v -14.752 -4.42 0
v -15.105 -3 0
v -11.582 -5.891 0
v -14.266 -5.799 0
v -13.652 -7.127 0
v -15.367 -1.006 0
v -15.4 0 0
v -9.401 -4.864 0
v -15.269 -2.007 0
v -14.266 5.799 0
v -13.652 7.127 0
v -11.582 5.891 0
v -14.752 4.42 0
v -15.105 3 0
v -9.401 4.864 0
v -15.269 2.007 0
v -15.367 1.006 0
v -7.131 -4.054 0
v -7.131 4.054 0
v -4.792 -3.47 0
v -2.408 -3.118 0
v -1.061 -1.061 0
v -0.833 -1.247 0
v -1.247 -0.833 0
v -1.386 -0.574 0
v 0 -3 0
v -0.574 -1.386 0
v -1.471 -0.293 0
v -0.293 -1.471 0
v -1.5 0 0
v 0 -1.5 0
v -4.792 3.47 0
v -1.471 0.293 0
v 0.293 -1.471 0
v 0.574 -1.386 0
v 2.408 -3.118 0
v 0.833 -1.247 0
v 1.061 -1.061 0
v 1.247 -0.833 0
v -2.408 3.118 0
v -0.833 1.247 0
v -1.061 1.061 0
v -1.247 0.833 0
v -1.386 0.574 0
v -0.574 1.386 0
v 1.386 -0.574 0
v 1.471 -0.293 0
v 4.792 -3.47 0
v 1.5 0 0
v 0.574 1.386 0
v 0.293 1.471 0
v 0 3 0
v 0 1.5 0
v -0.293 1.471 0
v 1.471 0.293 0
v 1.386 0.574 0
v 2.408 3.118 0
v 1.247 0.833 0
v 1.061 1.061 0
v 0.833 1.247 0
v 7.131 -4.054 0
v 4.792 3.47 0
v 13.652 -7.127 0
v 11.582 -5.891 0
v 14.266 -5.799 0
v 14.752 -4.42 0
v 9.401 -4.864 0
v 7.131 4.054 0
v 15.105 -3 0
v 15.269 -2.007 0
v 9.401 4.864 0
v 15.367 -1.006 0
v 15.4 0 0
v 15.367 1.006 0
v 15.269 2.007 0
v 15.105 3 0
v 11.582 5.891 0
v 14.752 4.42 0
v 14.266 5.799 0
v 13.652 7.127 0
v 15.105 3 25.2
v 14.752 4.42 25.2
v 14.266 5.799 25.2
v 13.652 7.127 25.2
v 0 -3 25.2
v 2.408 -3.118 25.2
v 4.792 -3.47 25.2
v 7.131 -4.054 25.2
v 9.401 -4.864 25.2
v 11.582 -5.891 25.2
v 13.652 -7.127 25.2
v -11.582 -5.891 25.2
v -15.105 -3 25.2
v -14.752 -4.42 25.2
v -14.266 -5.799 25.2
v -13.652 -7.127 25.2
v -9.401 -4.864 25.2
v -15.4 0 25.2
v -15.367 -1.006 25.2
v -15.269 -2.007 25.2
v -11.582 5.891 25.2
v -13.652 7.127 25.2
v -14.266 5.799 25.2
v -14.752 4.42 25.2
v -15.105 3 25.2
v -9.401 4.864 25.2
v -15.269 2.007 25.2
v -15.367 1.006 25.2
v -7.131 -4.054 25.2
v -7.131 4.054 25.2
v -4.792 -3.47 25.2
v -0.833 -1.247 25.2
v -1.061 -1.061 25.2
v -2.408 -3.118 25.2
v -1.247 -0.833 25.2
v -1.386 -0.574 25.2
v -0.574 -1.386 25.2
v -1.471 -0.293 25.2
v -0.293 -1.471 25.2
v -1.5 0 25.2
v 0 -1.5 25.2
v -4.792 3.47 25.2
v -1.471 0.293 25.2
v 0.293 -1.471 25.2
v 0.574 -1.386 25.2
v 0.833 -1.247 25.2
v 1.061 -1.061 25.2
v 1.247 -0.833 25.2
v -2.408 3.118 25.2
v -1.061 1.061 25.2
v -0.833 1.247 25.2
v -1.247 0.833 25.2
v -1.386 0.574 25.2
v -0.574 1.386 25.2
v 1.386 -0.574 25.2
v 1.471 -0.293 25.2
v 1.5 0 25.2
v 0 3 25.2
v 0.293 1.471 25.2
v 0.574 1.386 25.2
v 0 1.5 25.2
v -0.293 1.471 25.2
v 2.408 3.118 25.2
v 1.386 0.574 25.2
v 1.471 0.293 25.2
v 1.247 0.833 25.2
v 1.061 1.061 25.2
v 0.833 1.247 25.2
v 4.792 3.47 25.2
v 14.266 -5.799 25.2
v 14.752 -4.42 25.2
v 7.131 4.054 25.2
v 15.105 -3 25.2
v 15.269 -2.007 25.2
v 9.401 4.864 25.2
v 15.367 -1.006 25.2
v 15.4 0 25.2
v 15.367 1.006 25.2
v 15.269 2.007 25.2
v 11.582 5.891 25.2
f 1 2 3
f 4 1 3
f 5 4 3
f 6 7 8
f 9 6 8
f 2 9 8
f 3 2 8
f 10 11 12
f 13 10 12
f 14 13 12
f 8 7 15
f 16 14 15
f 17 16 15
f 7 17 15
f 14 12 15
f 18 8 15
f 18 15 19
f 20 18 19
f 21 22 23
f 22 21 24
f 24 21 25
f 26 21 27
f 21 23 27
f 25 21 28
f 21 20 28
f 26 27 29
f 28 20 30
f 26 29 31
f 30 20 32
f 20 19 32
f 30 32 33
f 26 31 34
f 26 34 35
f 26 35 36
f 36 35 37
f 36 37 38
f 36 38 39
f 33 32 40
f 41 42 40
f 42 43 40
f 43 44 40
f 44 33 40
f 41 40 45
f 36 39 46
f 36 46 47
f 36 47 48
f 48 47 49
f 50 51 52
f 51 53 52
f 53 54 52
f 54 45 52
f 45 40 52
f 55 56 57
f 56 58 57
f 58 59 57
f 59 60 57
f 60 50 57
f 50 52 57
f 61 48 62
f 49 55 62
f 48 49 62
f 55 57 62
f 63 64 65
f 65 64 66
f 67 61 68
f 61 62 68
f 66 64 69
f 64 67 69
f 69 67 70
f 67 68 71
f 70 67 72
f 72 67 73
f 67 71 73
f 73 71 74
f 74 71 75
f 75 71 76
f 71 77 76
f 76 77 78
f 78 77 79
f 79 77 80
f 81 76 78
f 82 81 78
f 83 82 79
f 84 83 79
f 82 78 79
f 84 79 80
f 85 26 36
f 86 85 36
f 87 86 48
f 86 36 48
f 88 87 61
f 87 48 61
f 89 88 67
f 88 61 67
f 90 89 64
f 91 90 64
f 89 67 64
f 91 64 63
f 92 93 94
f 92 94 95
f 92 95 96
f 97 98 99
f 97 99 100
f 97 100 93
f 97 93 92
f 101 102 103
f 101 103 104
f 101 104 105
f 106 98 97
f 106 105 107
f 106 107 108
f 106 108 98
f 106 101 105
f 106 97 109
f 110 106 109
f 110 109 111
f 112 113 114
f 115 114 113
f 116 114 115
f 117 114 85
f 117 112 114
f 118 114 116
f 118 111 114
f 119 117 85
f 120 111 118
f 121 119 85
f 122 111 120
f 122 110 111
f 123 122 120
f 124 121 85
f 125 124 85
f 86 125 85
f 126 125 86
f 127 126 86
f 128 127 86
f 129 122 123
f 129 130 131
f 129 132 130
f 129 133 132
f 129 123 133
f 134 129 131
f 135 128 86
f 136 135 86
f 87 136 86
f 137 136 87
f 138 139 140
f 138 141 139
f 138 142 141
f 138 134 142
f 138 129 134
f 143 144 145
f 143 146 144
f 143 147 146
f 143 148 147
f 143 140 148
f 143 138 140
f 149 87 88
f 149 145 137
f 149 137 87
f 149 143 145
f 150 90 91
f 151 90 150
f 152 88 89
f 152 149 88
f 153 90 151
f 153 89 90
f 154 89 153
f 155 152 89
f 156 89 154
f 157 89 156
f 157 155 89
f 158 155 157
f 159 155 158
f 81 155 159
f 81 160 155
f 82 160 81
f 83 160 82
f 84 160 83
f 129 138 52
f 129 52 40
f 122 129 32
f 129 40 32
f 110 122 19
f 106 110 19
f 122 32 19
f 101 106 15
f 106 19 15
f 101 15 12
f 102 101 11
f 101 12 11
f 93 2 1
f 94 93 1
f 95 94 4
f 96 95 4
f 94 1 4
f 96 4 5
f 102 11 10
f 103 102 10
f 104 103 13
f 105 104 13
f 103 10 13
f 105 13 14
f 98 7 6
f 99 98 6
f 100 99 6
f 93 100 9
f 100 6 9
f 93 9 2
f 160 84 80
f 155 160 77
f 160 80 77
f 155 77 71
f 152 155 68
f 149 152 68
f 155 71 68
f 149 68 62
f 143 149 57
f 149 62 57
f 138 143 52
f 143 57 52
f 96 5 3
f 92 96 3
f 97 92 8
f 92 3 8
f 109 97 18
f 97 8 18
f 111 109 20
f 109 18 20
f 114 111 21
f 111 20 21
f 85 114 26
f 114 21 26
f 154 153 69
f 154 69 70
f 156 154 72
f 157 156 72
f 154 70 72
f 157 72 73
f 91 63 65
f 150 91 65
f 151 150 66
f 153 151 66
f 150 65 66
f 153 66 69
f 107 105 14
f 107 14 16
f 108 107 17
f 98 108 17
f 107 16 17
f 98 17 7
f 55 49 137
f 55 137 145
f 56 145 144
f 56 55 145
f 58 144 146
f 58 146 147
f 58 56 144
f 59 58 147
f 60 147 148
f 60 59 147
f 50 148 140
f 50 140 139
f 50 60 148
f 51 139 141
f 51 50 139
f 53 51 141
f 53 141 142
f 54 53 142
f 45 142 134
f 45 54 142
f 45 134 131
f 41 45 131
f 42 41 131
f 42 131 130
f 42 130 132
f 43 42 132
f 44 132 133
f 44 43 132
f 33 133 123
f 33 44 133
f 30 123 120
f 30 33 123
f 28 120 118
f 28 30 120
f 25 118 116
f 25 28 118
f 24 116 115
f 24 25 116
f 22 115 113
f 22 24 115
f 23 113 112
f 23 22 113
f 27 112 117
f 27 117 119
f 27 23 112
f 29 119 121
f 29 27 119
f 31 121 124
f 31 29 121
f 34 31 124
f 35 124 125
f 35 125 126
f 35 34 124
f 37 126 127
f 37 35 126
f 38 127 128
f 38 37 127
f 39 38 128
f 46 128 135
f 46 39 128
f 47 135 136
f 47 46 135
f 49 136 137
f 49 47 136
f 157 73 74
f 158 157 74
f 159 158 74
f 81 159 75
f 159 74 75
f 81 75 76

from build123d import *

# Parameters (mm, degrees)
SKETCH_1_R      = 1.5
EXTRUDE_1_DEPTH = 25.2


with BuildPart() as part:
    # 草图1 → 凸台-拉伸1 (new body)
    with BuildSketch(Plane.XY):
        with BuildLine():
            ThreePointArc((-13.651838143, 7.126521965), (-14.525683909, 5.115125313), (-15.104966071, 3))
            Line((-15.104966071, 3), (1.6e-08, 3))
            ThreePointArc((1.6e-08, 3), (-7.130933806, 4.054175866), (-13.651838143, 7.126521965))
        make_face()
        with BuildLine():
            Line((1.6e-08, 3), (-15.104966071, 3))
            ThreePointArc((-15.104966071, 3), (-15.326064033, 1.507236297), (-15.4, 0))
            ThreePointArc((-15.4, 0), (-15.326064033, -1.507236297), (-15.104966071, -3))
            Line((-15.104966071, -3), (0, -3))
            Line((0, -3), (15.104966071, -3))
            ThreePointArc((15.104966071, -3), (15.326064033, -1.507236297), (15.4, 0))
            ThreePointArc((15.4, 0), (15.326064033, 1.507236297), (15.104966071, 3))
            Line((15.104966071, 3), (1.6e-08, 3))
        make_face()
        Circle(SKETCH_1_R, mode=Mode.SUBTRACT)
        with BuildLine():
            Line((0, -3), (-15.104966071, -3))
            ThreePointArc((-15.104966071, -3), (-14.525683909, -5.115125313), (-13.651838143, -7.126521965))
            ThreePointArc((-13.651838143, -7.126521965), (-7.130933814, -4.054175868), (0, -3))
        make_face()
        with BuildLine():
            ThreePointArc((13.651838143, 7.126521965), (7.130933821, 4.05417587), (1.6e-08, 3))
            Line((1.6e-08, 3), (15.104966071, 3))
            ThreePointArc((15.104966071, 3), (14.525683909, 5.115125313), (13.651838143, 7.126521965))
        make_face()
        with BuildLine():
            Line((15.104966071, -3), (0, -3))
            ThreePointArc((0, -3), (7.130933814, -4.054175868), (13.651838143, -7.126521965))
            ThreePointArc((13.651838143, -7.126521965), (14.525683909, -5.115125313), (15.104966071, -3))
        make_face()
    extrude(amount=EXTRUDE_1_DEPTH)


solid = part.part
